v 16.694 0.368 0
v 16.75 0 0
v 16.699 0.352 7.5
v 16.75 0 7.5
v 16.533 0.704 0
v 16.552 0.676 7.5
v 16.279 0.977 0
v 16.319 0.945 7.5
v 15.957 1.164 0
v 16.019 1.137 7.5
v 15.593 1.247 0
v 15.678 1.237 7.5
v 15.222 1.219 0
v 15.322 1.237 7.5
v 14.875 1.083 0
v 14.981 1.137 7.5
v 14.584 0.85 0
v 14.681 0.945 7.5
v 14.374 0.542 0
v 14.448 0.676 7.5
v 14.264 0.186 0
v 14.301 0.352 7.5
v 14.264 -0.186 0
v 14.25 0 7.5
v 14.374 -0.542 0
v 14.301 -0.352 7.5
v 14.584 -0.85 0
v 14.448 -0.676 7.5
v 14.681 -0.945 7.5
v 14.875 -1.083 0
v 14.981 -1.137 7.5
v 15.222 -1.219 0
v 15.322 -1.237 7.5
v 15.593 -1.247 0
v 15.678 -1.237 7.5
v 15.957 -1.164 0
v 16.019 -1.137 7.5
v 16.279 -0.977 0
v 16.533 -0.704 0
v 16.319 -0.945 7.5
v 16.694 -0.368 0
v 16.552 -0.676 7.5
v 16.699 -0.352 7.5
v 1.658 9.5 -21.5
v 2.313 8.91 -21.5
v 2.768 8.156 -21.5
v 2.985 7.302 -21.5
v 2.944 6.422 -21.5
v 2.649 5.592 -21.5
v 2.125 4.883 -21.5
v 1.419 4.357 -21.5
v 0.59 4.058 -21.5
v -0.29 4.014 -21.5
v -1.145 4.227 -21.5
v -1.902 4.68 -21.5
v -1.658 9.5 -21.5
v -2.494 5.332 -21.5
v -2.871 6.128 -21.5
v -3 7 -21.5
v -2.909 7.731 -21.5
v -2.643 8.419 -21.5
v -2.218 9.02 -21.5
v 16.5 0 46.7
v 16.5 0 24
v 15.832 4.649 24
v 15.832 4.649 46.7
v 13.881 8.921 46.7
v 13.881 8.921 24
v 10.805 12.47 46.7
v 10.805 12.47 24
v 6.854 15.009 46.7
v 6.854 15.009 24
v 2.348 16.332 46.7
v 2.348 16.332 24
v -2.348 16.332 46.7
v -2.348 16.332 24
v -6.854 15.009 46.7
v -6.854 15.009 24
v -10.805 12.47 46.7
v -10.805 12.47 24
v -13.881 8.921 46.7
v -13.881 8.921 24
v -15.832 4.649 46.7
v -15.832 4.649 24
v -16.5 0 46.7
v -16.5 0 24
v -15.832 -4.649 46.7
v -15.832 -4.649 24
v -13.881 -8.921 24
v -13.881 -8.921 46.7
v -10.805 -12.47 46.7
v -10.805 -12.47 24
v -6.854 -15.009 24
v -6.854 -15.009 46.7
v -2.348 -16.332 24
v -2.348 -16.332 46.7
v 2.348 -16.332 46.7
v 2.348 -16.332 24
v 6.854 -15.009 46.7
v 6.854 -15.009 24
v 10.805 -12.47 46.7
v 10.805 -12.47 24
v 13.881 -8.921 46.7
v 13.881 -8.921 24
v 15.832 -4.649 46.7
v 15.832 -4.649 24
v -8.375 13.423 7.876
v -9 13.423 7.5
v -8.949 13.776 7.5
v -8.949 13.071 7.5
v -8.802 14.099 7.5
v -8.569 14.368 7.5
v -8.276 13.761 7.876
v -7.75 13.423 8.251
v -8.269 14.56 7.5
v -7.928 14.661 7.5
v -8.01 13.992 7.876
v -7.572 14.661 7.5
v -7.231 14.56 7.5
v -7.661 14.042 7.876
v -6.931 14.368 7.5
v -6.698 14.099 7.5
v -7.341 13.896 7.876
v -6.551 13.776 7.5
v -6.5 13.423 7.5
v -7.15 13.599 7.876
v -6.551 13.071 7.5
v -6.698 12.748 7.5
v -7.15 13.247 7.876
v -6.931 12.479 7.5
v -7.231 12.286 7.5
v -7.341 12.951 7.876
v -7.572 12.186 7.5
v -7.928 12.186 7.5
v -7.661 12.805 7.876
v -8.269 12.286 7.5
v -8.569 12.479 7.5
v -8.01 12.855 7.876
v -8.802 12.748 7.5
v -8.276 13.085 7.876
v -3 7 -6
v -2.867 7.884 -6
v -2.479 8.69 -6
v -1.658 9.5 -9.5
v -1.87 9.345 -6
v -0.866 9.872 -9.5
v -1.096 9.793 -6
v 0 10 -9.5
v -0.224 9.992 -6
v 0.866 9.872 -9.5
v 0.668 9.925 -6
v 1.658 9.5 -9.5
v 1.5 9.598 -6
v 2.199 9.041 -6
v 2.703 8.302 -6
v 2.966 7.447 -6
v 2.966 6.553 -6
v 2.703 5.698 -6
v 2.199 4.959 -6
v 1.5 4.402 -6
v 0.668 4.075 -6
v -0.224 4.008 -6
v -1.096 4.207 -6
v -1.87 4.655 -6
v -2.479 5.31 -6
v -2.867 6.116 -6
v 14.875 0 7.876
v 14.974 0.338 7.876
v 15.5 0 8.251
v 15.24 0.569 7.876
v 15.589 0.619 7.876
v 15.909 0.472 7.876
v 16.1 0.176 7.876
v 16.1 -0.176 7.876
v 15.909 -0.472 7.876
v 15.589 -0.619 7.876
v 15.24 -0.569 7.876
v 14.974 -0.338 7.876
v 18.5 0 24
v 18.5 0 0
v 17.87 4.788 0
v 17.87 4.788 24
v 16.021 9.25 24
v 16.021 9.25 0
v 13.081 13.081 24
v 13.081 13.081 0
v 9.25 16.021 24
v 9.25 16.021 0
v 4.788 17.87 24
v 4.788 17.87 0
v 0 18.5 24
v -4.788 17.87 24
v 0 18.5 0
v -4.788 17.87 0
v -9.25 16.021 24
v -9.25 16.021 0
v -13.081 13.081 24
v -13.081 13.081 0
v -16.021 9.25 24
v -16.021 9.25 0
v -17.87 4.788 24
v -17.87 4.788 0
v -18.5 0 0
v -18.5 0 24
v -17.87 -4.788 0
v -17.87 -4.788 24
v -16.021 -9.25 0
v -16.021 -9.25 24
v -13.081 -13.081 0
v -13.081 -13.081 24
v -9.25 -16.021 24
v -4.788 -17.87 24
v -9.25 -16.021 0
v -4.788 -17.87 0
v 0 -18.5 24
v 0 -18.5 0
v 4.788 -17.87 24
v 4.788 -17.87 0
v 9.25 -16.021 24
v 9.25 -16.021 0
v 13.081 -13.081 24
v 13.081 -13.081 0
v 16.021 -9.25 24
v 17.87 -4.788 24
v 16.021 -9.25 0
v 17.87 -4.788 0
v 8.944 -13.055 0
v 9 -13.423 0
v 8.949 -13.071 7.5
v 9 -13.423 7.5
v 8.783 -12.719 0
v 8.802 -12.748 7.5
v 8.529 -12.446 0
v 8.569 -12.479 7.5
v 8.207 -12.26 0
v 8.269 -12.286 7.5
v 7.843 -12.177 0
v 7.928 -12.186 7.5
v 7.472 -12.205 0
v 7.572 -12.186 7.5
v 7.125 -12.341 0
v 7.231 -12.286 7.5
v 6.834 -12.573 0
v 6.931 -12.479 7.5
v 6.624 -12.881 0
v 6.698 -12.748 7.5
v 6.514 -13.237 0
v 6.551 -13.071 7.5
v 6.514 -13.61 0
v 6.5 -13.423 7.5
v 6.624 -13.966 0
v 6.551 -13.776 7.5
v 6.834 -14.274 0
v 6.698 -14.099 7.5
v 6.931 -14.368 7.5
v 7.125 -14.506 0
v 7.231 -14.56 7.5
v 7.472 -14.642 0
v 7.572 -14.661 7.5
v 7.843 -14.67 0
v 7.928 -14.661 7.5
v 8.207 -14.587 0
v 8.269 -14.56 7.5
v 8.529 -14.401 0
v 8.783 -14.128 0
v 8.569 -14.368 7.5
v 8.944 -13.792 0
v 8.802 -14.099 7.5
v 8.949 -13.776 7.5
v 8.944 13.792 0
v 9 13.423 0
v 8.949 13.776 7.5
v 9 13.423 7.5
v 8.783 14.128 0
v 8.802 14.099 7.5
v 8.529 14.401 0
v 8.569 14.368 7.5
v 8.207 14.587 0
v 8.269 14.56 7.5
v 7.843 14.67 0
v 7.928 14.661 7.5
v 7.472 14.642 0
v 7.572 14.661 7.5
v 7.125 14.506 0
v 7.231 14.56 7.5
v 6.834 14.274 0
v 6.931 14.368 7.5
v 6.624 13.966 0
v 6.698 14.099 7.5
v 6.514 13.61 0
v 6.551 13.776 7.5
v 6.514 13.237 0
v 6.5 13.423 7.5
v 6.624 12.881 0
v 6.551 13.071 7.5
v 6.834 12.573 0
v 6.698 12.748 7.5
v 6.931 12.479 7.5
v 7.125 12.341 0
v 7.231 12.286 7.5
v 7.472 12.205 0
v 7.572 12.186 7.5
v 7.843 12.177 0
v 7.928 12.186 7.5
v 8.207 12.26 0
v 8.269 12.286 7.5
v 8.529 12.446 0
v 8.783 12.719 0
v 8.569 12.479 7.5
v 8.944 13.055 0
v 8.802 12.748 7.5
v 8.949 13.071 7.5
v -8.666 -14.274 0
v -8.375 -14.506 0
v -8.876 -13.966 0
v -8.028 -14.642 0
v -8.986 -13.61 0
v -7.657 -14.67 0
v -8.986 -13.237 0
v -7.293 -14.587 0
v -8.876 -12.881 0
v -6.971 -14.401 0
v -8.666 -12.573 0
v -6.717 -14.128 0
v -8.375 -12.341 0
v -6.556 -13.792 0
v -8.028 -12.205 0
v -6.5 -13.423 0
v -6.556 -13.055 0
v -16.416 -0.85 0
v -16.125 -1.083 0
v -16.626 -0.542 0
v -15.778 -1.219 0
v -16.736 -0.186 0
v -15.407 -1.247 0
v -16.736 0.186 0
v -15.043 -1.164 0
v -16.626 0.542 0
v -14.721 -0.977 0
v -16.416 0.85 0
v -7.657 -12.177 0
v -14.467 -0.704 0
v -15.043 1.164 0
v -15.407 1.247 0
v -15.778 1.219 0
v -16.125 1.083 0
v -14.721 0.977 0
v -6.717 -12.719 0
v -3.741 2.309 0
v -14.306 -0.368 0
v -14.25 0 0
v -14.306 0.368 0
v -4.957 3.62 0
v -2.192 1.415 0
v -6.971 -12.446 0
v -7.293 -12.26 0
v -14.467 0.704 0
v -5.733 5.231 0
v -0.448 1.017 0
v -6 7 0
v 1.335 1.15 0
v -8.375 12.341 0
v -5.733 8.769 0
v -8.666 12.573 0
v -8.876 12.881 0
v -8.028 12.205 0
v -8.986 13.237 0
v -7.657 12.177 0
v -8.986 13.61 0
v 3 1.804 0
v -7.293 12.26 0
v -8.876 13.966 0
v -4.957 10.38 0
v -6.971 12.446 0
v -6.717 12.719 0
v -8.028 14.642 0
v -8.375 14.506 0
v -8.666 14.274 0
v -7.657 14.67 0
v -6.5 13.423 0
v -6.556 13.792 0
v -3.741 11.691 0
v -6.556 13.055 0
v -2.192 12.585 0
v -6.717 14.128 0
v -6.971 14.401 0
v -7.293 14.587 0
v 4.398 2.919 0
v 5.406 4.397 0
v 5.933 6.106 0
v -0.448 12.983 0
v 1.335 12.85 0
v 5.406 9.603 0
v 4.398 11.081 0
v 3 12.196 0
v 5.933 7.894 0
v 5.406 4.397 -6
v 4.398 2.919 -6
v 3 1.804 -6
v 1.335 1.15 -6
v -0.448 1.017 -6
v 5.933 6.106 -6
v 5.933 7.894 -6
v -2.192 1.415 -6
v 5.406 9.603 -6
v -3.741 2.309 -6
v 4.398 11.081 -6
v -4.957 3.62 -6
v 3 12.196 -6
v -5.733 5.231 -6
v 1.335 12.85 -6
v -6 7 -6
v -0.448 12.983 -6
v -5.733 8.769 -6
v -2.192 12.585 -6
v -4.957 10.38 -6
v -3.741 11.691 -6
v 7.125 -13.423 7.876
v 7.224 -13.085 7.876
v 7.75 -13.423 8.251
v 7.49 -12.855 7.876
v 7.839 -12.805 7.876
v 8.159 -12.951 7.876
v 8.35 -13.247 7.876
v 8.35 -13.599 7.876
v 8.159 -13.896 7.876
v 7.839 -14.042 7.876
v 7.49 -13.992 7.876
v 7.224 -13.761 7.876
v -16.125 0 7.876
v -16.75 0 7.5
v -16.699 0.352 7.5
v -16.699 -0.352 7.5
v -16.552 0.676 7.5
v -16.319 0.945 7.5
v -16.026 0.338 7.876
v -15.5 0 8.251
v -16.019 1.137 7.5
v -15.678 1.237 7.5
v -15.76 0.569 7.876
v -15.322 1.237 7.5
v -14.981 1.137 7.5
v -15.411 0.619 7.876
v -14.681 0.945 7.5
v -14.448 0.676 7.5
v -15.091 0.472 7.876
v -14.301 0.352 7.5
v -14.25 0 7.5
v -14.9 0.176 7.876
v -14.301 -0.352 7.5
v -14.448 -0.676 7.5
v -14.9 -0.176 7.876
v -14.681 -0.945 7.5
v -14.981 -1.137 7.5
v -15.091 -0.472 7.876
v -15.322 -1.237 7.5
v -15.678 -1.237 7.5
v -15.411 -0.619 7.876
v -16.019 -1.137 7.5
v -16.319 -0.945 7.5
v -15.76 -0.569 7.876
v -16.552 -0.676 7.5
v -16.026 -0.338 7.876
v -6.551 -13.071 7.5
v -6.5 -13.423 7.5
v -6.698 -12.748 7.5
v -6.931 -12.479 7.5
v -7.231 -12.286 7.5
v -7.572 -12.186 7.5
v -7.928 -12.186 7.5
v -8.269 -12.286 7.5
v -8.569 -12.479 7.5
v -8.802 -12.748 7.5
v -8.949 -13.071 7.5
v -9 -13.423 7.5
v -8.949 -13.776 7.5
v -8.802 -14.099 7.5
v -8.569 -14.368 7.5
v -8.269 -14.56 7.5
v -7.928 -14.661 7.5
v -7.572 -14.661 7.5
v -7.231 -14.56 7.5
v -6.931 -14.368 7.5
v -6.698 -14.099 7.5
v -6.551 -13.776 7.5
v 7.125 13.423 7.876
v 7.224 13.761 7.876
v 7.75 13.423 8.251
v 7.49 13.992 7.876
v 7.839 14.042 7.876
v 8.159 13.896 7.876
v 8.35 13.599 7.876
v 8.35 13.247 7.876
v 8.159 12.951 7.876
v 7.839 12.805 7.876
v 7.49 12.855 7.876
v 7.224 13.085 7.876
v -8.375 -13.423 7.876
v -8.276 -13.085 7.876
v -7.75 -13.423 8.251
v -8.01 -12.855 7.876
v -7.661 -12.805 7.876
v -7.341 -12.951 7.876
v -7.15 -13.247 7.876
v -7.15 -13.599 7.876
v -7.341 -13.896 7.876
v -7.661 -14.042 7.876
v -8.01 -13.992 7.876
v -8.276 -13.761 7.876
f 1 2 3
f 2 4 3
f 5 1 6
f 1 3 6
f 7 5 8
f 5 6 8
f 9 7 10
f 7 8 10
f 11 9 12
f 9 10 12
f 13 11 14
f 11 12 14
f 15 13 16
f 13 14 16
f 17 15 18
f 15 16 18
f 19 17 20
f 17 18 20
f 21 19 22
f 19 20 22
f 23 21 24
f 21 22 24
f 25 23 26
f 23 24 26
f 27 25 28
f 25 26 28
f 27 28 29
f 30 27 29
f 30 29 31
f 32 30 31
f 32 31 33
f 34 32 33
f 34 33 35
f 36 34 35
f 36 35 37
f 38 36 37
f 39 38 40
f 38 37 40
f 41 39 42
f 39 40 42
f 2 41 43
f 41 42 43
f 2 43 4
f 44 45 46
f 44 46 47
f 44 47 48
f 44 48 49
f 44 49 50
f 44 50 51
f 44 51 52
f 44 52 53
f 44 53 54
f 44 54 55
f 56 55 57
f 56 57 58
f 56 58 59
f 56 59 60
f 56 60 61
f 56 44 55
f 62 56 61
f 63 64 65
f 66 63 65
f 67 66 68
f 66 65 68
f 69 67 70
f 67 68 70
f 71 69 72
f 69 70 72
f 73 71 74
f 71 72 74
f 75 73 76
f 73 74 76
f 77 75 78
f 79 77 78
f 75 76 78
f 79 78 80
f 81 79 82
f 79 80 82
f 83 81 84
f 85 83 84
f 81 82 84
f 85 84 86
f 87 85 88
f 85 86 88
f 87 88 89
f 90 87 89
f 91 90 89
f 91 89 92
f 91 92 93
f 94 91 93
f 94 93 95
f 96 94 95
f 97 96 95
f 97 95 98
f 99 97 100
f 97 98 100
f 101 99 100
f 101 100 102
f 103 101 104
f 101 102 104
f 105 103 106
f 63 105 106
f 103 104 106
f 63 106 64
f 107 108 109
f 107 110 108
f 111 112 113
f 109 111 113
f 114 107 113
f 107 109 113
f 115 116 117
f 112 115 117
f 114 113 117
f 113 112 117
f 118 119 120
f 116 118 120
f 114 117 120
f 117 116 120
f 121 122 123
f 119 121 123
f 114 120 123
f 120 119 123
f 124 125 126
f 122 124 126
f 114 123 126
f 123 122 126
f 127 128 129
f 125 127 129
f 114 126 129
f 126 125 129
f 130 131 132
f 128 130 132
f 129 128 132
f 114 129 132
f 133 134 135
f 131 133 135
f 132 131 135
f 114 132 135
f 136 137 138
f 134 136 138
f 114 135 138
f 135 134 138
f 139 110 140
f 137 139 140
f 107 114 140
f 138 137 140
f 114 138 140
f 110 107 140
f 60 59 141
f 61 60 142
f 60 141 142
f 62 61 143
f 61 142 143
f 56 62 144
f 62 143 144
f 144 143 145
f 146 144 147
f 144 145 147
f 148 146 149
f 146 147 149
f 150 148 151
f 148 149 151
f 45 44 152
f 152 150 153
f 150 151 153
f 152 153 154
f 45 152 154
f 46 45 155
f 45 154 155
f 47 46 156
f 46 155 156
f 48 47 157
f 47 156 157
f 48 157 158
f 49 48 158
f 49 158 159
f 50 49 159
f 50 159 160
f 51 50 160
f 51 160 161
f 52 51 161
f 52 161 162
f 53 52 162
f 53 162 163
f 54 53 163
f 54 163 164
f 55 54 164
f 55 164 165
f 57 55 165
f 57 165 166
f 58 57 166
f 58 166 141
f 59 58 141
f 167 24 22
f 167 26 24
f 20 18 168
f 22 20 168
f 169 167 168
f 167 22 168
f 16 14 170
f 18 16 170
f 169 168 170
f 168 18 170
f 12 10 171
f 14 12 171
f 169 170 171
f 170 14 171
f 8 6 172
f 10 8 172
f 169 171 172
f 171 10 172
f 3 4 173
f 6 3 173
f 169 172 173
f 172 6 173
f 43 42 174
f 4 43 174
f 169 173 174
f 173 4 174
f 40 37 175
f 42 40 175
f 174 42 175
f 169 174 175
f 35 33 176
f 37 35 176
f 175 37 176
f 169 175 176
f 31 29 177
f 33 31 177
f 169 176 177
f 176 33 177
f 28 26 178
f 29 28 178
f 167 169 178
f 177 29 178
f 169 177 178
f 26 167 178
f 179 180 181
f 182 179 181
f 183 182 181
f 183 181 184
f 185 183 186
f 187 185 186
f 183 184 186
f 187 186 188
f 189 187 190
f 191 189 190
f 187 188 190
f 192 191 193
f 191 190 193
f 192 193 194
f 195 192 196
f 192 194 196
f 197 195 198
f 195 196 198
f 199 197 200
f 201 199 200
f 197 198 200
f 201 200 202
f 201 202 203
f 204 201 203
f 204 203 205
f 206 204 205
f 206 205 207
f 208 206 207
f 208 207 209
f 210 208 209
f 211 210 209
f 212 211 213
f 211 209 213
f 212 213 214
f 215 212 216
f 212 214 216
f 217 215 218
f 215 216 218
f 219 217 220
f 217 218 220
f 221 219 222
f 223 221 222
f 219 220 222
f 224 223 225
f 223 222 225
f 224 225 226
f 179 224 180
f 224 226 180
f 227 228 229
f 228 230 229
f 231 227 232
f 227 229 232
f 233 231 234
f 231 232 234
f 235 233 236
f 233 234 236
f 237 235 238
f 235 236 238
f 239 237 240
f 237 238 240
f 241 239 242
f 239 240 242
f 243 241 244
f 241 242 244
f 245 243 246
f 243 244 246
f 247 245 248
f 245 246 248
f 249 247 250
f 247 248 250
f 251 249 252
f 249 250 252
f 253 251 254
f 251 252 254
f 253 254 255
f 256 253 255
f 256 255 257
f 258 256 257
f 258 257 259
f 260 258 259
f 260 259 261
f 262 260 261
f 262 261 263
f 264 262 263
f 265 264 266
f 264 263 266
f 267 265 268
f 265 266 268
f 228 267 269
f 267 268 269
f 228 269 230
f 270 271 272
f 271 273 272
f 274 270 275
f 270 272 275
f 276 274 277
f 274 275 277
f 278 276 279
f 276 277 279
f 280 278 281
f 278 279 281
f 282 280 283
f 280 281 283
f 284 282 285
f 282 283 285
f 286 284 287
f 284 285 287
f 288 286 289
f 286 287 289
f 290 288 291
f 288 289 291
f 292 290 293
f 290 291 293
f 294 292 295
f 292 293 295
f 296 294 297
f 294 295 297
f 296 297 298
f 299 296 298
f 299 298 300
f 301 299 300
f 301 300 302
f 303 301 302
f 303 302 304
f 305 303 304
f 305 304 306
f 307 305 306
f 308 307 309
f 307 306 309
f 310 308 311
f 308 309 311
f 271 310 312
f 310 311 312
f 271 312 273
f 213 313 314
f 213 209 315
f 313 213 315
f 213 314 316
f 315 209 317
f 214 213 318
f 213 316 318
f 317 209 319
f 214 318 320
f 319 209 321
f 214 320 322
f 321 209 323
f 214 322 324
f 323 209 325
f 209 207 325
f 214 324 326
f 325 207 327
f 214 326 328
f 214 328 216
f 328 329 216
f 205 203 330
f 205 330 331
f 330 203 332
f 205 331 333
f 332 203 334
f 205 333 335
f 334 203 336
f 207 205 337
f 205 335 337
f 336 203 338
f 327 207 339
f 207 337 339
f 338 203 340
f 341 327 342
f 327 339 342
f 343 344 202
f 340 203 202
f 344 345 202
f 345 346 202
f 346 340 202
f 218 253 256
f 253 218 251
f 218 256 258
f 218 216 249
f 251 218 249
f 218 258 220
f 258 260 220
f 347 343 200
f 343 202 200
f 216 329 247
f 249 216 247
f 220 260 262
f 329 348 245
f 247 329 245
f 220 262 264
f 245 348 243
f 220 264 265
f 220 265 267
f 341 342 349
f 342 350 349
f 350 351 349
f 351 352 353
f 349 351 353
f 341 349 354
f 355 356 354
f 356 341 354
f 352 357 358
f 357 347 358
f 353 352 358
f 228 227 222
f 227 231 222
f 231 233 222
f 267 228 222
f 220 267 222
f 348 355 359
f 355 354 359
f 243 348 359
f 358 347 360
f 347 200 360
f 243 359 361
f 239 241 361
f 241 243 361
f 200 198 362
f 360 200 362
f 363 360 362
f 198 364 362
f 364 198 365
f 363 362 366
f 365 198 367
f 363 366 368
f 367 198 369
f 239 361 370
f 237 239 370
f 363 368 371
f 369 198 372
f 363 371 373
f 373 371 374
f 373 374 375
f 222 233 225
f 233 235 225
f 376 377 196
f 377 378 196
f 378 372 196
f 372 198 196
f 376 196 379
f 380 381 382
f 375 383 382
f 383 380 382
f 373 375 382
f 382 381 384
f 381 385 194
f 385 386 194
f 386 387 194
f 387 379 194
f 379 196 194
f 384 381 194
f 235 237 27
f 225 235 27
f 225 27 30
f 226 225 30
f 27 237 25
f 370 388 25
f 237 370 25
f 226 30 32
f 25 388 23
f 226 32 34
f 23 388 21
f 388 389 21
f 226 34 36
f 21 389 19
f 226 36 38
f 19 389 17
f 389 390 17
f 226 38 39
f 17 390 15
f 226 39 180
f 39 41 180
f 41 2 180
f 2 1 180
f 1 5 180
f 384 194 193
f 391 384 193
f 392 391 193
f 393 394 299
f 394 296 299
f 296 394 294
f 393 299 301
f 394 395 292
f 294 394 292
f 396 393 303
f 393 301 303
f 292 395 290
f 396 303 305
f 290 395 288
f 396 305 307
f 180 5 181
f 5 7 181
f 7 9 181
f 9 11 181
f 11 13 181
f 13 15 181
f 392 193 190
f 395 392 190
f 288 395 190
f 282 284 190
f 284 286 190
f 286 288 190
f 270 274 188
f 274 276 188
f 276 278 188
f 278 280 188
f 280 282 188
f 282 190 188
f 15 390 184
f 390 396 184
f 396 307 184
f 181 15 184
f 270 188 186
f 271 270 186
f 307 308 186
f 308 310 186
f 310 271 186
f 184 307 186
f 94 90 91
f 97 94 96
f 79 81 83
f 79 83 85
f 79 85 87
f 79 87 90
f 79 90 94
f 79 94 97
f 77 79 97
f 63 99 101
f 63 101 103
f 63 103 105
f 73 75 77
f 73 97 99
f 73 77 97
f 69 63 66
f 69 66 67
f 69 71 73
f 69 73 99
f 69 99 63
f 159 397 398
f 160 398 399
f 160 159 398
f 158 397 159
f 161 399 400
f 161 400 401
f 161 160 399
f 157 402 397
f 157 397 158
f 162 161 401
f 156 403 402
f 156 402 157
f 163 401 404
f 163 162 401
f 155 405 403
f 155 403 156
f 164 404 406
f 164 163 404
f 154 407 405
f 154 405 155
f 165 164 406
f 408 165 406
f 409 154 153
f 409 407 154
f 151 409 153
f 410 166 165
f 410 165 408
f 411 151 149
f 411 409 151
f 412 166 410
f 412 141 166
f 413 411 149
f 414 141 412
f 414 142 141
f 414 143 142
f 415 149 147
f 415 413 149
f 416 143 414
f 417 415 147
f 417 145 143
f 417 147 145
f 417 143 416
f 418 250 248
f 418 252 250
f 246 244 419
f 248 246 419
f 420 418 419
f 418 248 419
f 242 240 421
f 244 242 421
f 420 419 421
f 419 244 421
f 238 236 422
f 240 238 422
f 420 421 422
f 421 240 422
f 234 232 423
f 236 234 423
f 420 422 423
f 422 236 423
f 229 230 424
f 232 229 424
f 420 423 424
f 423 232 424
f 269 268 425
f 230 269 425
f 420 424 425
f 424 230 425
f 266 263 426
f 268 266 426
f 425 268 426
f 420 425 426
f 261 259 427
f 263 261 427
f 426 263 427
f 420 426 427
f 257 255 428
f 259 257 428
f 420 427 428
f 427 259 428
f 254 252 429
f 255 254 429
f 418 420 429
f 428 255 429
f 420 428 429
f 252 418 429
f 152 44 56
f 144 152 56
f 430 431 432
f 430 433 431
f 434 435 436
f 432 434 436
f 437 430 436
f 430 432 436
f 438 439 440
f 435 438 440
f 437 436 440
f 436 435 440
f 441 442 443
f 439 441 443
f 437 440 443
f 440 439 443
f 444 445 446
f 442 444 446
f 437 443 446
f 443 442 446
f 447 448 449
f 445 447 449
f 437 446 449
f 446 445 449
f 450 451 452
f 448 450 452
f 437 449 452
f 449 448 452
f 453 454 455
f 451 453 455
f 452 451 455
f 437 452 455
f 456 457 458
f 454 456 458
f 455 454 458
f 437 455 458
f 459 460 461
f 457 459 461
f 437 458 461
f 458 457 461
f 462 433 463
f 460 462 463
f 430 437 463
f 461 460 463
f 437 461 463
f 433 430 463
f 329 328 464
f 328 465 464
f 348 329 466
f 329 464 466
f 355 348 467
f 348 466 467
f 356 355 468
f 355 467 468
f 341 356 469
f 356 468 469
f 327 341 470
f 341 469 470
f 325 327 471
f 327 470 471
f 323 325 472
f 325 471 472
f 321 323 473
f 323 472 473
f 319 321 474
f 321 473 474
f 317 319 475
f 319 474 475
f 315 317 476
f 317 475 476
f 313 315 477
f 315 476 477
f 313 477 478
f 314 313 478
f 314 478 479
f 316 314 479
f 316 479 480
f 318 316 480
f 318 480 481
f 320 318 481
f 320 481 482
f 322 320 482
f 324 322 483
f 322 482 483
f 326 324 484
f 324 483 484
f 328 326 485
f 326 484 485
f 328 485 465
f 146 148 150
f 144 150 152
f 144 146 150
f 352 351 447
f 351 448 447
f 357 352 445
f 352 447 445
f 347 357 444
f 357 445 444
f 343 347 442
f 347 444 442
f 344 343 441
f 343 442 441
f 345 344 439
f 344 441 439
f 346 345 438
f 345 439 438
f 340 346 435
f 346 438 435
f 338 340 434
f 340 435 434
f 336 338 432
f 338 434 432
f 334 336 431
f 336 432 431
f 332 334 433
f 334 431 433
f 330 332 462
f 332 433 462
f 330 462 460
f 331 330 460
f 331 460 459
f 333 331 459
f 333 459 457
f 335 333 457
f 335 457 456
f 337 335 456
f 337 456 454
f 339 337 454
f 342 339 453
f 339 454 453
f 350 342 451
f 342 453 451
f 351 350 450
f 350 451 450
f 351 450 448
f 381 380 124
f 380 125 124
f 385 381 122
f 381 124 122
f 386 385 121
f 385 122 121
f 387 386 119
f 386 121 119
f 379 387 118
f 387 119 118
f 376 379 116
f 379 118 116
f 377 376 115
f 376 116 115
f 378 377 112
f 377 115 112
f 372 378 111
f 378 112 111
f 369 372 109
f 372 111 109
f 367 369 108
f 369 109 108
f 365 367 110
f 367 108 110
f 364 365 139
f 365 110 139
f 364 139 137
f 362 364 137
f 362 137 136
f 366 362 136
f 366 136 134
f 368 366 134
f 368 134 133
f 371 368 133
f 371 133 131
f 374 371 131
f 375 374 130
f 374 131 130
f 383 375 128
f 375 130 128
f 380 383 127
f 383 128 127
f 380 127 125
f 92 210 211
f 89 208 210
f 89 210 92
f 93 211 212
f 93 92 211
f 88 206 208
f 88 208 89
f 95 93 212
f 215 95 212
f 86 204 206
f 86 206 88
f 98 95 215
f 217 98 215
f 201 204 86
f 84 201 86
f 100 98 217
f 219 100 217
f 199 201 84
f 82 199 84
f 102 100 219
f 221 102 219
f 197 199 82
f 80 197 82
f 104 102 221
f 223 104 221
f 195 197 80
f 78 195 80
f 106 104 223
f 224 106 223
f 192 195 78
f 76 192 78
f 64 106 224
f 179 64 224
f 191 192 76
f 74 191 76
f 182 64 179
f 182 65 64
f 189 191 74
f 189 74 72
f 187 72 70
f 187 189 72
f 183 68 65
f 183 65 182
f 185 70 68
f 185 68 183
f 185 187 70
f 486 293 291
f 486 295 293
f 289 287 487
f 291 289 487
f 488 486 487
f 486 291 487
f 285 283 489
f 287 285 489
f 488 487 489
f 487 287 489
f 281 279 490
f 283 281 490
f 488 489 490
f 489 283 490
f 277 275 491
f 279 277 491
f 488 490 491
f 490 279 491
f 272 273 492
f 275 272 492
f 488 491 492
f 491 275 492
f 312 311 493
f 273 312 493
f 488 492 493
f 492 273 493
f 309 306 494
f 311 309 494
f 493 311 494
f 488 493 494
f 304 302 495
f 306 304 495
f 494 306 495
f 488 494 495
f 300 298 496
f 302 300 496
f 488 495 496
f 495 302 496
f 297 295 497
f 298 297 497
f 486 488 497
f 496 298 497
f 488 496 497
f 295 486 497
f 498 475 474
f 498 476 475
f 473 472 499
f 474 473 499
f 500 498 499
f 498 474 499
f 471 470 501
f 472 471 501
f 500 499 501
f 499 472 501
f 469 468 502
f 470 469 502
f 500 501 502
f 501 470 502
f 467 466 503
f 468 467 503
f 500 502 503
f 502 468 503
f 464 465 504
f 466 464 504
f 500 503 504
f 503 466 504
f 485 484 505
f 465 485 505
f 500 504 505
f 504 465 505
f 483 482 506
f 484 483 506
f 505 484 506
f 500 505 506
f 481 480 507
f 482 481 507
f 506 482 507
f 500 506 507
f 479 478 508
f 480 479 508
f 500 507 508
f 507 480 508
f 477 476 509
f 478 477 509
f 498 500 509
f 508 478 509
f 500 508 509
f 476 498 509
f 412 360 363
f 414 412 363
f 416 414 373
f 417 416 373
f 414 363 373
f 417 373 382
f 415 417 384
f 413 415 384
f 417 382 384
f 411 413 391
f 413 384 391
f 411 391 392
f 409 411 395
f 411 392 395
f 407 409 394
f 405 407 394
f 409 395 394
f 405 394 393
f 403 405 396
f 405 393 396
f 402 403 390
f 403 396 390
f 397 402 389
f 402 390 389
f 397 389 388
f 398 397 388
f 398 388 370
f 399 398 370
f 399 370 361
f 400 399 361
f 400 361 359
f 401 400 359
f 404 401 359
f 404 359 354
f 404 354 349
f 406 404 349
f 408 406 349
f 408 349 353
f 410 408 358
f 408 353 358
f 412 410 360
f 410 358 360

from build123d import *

# Parameters (mm, degrees)
SKETCH_1_R             = 18.5
EXTRUDE_1_DEPTH        = 24
SKETCH_2_R             = 16.5
EXTRUDE_2_DEPTH        = 22.7
SKETCH_3_R             = 6
EXTRUDE_3_DEPTH        = 6
SKETCH_4_R             = 3
EXTRUDE_4_DEPTH        = 15.5
SKETCH_5_W             = 5.944067487
SKETCH_5_H             = 2.922499848
CUT_EXTRUDE_1_DEPTH    = 12
HOLE_WIZARD_M3_1_D     = 2.5
HOLE_WIZARD_M3_1_DEPTH = 7.5
HOLE_WIZARD_M3_1_TIP   = 0.751075774


with BuildPart() as part:
    # 草图1 → 凸台-拉伸1 (new body)
    with BuildSketch(Plane.XY):
        Circle(SKETCH_1_R)
    extrude(amount=EXTRUDE_1_DEPTH)

    # 草图2 → 凸台-拉伸2 (add)
    with BuildSketch(Plane.XY.offset(24)):
        Circle(SKETCH_2_R)
    extrude(amount=EXTRUDE_2_DEPTH)

    # 草图3 → 凸台-拉伸3 (add)
    with BuildSketch(Plane(origin=(0, 0, 0), x_dir=(-1, 0, 0), z_dir=(0, 0, -1))):
        with Locations((0, 7)):
            Circle(SKETCH_3_R)
    extrude(amount=EXTRUDE_3_DEPTH)

    # 草图4 → 凸台-拉伸4 (add)
    with BuildSketch(Plane(origin=(0, 0, -6), x_dir=(-1, 0, 0), z_dir=(0, 0, -1))):
        with Locations((0, 7)):
            Circle(SKETCH_4_R)
    extrude(amount=EXTRUDE_4_DEPTH)

    # 草图5 → 切除-拉伸1 (cut)
    with BuildSketch(Plane(origin=(0, 0, -21.5), x_dir=(-1, 0, 0), z_dir=(0, 0, -1))):
        with Locations((0.222902531, 10.961249924)):
            Rectangle(SKETCH_5_W, SKETCH_5_H)
    extrude(amount=-CUT_EXTRUDE_1_DEPTH, mode=Mode.SUBTRACT)

    # M3 螺纹孔1
    with Locations(Plane(origin=(0, 0, 0), x_dir=(-1, 0, 0), z_dir=(0, 0, -1))):
        with Locations((-15.5, 0), (-7.75, 13.423393759), (7.75, 13.423393759), (15.5, 0), (7.75, -13.423393759), (-7.75, -13.423393759)):
            Hole(HOLE_WIZARD_M3_1_D / 2, depth=HOLE_WIZARD_M3_1_DEPTH)
            with Locations((0, 0, -(HOLE_WIZARD_M3_1_DEPTH + HOLE_WIZARD_M3_1_TIP / 2))):  # 118° drill point
                Cone(0, HOLE_WIZARD_M3_1_D / 2, HOLE_WIZARD_M3_1_TIP, mode=Mode.SUBTRACT)


solid = part.part
